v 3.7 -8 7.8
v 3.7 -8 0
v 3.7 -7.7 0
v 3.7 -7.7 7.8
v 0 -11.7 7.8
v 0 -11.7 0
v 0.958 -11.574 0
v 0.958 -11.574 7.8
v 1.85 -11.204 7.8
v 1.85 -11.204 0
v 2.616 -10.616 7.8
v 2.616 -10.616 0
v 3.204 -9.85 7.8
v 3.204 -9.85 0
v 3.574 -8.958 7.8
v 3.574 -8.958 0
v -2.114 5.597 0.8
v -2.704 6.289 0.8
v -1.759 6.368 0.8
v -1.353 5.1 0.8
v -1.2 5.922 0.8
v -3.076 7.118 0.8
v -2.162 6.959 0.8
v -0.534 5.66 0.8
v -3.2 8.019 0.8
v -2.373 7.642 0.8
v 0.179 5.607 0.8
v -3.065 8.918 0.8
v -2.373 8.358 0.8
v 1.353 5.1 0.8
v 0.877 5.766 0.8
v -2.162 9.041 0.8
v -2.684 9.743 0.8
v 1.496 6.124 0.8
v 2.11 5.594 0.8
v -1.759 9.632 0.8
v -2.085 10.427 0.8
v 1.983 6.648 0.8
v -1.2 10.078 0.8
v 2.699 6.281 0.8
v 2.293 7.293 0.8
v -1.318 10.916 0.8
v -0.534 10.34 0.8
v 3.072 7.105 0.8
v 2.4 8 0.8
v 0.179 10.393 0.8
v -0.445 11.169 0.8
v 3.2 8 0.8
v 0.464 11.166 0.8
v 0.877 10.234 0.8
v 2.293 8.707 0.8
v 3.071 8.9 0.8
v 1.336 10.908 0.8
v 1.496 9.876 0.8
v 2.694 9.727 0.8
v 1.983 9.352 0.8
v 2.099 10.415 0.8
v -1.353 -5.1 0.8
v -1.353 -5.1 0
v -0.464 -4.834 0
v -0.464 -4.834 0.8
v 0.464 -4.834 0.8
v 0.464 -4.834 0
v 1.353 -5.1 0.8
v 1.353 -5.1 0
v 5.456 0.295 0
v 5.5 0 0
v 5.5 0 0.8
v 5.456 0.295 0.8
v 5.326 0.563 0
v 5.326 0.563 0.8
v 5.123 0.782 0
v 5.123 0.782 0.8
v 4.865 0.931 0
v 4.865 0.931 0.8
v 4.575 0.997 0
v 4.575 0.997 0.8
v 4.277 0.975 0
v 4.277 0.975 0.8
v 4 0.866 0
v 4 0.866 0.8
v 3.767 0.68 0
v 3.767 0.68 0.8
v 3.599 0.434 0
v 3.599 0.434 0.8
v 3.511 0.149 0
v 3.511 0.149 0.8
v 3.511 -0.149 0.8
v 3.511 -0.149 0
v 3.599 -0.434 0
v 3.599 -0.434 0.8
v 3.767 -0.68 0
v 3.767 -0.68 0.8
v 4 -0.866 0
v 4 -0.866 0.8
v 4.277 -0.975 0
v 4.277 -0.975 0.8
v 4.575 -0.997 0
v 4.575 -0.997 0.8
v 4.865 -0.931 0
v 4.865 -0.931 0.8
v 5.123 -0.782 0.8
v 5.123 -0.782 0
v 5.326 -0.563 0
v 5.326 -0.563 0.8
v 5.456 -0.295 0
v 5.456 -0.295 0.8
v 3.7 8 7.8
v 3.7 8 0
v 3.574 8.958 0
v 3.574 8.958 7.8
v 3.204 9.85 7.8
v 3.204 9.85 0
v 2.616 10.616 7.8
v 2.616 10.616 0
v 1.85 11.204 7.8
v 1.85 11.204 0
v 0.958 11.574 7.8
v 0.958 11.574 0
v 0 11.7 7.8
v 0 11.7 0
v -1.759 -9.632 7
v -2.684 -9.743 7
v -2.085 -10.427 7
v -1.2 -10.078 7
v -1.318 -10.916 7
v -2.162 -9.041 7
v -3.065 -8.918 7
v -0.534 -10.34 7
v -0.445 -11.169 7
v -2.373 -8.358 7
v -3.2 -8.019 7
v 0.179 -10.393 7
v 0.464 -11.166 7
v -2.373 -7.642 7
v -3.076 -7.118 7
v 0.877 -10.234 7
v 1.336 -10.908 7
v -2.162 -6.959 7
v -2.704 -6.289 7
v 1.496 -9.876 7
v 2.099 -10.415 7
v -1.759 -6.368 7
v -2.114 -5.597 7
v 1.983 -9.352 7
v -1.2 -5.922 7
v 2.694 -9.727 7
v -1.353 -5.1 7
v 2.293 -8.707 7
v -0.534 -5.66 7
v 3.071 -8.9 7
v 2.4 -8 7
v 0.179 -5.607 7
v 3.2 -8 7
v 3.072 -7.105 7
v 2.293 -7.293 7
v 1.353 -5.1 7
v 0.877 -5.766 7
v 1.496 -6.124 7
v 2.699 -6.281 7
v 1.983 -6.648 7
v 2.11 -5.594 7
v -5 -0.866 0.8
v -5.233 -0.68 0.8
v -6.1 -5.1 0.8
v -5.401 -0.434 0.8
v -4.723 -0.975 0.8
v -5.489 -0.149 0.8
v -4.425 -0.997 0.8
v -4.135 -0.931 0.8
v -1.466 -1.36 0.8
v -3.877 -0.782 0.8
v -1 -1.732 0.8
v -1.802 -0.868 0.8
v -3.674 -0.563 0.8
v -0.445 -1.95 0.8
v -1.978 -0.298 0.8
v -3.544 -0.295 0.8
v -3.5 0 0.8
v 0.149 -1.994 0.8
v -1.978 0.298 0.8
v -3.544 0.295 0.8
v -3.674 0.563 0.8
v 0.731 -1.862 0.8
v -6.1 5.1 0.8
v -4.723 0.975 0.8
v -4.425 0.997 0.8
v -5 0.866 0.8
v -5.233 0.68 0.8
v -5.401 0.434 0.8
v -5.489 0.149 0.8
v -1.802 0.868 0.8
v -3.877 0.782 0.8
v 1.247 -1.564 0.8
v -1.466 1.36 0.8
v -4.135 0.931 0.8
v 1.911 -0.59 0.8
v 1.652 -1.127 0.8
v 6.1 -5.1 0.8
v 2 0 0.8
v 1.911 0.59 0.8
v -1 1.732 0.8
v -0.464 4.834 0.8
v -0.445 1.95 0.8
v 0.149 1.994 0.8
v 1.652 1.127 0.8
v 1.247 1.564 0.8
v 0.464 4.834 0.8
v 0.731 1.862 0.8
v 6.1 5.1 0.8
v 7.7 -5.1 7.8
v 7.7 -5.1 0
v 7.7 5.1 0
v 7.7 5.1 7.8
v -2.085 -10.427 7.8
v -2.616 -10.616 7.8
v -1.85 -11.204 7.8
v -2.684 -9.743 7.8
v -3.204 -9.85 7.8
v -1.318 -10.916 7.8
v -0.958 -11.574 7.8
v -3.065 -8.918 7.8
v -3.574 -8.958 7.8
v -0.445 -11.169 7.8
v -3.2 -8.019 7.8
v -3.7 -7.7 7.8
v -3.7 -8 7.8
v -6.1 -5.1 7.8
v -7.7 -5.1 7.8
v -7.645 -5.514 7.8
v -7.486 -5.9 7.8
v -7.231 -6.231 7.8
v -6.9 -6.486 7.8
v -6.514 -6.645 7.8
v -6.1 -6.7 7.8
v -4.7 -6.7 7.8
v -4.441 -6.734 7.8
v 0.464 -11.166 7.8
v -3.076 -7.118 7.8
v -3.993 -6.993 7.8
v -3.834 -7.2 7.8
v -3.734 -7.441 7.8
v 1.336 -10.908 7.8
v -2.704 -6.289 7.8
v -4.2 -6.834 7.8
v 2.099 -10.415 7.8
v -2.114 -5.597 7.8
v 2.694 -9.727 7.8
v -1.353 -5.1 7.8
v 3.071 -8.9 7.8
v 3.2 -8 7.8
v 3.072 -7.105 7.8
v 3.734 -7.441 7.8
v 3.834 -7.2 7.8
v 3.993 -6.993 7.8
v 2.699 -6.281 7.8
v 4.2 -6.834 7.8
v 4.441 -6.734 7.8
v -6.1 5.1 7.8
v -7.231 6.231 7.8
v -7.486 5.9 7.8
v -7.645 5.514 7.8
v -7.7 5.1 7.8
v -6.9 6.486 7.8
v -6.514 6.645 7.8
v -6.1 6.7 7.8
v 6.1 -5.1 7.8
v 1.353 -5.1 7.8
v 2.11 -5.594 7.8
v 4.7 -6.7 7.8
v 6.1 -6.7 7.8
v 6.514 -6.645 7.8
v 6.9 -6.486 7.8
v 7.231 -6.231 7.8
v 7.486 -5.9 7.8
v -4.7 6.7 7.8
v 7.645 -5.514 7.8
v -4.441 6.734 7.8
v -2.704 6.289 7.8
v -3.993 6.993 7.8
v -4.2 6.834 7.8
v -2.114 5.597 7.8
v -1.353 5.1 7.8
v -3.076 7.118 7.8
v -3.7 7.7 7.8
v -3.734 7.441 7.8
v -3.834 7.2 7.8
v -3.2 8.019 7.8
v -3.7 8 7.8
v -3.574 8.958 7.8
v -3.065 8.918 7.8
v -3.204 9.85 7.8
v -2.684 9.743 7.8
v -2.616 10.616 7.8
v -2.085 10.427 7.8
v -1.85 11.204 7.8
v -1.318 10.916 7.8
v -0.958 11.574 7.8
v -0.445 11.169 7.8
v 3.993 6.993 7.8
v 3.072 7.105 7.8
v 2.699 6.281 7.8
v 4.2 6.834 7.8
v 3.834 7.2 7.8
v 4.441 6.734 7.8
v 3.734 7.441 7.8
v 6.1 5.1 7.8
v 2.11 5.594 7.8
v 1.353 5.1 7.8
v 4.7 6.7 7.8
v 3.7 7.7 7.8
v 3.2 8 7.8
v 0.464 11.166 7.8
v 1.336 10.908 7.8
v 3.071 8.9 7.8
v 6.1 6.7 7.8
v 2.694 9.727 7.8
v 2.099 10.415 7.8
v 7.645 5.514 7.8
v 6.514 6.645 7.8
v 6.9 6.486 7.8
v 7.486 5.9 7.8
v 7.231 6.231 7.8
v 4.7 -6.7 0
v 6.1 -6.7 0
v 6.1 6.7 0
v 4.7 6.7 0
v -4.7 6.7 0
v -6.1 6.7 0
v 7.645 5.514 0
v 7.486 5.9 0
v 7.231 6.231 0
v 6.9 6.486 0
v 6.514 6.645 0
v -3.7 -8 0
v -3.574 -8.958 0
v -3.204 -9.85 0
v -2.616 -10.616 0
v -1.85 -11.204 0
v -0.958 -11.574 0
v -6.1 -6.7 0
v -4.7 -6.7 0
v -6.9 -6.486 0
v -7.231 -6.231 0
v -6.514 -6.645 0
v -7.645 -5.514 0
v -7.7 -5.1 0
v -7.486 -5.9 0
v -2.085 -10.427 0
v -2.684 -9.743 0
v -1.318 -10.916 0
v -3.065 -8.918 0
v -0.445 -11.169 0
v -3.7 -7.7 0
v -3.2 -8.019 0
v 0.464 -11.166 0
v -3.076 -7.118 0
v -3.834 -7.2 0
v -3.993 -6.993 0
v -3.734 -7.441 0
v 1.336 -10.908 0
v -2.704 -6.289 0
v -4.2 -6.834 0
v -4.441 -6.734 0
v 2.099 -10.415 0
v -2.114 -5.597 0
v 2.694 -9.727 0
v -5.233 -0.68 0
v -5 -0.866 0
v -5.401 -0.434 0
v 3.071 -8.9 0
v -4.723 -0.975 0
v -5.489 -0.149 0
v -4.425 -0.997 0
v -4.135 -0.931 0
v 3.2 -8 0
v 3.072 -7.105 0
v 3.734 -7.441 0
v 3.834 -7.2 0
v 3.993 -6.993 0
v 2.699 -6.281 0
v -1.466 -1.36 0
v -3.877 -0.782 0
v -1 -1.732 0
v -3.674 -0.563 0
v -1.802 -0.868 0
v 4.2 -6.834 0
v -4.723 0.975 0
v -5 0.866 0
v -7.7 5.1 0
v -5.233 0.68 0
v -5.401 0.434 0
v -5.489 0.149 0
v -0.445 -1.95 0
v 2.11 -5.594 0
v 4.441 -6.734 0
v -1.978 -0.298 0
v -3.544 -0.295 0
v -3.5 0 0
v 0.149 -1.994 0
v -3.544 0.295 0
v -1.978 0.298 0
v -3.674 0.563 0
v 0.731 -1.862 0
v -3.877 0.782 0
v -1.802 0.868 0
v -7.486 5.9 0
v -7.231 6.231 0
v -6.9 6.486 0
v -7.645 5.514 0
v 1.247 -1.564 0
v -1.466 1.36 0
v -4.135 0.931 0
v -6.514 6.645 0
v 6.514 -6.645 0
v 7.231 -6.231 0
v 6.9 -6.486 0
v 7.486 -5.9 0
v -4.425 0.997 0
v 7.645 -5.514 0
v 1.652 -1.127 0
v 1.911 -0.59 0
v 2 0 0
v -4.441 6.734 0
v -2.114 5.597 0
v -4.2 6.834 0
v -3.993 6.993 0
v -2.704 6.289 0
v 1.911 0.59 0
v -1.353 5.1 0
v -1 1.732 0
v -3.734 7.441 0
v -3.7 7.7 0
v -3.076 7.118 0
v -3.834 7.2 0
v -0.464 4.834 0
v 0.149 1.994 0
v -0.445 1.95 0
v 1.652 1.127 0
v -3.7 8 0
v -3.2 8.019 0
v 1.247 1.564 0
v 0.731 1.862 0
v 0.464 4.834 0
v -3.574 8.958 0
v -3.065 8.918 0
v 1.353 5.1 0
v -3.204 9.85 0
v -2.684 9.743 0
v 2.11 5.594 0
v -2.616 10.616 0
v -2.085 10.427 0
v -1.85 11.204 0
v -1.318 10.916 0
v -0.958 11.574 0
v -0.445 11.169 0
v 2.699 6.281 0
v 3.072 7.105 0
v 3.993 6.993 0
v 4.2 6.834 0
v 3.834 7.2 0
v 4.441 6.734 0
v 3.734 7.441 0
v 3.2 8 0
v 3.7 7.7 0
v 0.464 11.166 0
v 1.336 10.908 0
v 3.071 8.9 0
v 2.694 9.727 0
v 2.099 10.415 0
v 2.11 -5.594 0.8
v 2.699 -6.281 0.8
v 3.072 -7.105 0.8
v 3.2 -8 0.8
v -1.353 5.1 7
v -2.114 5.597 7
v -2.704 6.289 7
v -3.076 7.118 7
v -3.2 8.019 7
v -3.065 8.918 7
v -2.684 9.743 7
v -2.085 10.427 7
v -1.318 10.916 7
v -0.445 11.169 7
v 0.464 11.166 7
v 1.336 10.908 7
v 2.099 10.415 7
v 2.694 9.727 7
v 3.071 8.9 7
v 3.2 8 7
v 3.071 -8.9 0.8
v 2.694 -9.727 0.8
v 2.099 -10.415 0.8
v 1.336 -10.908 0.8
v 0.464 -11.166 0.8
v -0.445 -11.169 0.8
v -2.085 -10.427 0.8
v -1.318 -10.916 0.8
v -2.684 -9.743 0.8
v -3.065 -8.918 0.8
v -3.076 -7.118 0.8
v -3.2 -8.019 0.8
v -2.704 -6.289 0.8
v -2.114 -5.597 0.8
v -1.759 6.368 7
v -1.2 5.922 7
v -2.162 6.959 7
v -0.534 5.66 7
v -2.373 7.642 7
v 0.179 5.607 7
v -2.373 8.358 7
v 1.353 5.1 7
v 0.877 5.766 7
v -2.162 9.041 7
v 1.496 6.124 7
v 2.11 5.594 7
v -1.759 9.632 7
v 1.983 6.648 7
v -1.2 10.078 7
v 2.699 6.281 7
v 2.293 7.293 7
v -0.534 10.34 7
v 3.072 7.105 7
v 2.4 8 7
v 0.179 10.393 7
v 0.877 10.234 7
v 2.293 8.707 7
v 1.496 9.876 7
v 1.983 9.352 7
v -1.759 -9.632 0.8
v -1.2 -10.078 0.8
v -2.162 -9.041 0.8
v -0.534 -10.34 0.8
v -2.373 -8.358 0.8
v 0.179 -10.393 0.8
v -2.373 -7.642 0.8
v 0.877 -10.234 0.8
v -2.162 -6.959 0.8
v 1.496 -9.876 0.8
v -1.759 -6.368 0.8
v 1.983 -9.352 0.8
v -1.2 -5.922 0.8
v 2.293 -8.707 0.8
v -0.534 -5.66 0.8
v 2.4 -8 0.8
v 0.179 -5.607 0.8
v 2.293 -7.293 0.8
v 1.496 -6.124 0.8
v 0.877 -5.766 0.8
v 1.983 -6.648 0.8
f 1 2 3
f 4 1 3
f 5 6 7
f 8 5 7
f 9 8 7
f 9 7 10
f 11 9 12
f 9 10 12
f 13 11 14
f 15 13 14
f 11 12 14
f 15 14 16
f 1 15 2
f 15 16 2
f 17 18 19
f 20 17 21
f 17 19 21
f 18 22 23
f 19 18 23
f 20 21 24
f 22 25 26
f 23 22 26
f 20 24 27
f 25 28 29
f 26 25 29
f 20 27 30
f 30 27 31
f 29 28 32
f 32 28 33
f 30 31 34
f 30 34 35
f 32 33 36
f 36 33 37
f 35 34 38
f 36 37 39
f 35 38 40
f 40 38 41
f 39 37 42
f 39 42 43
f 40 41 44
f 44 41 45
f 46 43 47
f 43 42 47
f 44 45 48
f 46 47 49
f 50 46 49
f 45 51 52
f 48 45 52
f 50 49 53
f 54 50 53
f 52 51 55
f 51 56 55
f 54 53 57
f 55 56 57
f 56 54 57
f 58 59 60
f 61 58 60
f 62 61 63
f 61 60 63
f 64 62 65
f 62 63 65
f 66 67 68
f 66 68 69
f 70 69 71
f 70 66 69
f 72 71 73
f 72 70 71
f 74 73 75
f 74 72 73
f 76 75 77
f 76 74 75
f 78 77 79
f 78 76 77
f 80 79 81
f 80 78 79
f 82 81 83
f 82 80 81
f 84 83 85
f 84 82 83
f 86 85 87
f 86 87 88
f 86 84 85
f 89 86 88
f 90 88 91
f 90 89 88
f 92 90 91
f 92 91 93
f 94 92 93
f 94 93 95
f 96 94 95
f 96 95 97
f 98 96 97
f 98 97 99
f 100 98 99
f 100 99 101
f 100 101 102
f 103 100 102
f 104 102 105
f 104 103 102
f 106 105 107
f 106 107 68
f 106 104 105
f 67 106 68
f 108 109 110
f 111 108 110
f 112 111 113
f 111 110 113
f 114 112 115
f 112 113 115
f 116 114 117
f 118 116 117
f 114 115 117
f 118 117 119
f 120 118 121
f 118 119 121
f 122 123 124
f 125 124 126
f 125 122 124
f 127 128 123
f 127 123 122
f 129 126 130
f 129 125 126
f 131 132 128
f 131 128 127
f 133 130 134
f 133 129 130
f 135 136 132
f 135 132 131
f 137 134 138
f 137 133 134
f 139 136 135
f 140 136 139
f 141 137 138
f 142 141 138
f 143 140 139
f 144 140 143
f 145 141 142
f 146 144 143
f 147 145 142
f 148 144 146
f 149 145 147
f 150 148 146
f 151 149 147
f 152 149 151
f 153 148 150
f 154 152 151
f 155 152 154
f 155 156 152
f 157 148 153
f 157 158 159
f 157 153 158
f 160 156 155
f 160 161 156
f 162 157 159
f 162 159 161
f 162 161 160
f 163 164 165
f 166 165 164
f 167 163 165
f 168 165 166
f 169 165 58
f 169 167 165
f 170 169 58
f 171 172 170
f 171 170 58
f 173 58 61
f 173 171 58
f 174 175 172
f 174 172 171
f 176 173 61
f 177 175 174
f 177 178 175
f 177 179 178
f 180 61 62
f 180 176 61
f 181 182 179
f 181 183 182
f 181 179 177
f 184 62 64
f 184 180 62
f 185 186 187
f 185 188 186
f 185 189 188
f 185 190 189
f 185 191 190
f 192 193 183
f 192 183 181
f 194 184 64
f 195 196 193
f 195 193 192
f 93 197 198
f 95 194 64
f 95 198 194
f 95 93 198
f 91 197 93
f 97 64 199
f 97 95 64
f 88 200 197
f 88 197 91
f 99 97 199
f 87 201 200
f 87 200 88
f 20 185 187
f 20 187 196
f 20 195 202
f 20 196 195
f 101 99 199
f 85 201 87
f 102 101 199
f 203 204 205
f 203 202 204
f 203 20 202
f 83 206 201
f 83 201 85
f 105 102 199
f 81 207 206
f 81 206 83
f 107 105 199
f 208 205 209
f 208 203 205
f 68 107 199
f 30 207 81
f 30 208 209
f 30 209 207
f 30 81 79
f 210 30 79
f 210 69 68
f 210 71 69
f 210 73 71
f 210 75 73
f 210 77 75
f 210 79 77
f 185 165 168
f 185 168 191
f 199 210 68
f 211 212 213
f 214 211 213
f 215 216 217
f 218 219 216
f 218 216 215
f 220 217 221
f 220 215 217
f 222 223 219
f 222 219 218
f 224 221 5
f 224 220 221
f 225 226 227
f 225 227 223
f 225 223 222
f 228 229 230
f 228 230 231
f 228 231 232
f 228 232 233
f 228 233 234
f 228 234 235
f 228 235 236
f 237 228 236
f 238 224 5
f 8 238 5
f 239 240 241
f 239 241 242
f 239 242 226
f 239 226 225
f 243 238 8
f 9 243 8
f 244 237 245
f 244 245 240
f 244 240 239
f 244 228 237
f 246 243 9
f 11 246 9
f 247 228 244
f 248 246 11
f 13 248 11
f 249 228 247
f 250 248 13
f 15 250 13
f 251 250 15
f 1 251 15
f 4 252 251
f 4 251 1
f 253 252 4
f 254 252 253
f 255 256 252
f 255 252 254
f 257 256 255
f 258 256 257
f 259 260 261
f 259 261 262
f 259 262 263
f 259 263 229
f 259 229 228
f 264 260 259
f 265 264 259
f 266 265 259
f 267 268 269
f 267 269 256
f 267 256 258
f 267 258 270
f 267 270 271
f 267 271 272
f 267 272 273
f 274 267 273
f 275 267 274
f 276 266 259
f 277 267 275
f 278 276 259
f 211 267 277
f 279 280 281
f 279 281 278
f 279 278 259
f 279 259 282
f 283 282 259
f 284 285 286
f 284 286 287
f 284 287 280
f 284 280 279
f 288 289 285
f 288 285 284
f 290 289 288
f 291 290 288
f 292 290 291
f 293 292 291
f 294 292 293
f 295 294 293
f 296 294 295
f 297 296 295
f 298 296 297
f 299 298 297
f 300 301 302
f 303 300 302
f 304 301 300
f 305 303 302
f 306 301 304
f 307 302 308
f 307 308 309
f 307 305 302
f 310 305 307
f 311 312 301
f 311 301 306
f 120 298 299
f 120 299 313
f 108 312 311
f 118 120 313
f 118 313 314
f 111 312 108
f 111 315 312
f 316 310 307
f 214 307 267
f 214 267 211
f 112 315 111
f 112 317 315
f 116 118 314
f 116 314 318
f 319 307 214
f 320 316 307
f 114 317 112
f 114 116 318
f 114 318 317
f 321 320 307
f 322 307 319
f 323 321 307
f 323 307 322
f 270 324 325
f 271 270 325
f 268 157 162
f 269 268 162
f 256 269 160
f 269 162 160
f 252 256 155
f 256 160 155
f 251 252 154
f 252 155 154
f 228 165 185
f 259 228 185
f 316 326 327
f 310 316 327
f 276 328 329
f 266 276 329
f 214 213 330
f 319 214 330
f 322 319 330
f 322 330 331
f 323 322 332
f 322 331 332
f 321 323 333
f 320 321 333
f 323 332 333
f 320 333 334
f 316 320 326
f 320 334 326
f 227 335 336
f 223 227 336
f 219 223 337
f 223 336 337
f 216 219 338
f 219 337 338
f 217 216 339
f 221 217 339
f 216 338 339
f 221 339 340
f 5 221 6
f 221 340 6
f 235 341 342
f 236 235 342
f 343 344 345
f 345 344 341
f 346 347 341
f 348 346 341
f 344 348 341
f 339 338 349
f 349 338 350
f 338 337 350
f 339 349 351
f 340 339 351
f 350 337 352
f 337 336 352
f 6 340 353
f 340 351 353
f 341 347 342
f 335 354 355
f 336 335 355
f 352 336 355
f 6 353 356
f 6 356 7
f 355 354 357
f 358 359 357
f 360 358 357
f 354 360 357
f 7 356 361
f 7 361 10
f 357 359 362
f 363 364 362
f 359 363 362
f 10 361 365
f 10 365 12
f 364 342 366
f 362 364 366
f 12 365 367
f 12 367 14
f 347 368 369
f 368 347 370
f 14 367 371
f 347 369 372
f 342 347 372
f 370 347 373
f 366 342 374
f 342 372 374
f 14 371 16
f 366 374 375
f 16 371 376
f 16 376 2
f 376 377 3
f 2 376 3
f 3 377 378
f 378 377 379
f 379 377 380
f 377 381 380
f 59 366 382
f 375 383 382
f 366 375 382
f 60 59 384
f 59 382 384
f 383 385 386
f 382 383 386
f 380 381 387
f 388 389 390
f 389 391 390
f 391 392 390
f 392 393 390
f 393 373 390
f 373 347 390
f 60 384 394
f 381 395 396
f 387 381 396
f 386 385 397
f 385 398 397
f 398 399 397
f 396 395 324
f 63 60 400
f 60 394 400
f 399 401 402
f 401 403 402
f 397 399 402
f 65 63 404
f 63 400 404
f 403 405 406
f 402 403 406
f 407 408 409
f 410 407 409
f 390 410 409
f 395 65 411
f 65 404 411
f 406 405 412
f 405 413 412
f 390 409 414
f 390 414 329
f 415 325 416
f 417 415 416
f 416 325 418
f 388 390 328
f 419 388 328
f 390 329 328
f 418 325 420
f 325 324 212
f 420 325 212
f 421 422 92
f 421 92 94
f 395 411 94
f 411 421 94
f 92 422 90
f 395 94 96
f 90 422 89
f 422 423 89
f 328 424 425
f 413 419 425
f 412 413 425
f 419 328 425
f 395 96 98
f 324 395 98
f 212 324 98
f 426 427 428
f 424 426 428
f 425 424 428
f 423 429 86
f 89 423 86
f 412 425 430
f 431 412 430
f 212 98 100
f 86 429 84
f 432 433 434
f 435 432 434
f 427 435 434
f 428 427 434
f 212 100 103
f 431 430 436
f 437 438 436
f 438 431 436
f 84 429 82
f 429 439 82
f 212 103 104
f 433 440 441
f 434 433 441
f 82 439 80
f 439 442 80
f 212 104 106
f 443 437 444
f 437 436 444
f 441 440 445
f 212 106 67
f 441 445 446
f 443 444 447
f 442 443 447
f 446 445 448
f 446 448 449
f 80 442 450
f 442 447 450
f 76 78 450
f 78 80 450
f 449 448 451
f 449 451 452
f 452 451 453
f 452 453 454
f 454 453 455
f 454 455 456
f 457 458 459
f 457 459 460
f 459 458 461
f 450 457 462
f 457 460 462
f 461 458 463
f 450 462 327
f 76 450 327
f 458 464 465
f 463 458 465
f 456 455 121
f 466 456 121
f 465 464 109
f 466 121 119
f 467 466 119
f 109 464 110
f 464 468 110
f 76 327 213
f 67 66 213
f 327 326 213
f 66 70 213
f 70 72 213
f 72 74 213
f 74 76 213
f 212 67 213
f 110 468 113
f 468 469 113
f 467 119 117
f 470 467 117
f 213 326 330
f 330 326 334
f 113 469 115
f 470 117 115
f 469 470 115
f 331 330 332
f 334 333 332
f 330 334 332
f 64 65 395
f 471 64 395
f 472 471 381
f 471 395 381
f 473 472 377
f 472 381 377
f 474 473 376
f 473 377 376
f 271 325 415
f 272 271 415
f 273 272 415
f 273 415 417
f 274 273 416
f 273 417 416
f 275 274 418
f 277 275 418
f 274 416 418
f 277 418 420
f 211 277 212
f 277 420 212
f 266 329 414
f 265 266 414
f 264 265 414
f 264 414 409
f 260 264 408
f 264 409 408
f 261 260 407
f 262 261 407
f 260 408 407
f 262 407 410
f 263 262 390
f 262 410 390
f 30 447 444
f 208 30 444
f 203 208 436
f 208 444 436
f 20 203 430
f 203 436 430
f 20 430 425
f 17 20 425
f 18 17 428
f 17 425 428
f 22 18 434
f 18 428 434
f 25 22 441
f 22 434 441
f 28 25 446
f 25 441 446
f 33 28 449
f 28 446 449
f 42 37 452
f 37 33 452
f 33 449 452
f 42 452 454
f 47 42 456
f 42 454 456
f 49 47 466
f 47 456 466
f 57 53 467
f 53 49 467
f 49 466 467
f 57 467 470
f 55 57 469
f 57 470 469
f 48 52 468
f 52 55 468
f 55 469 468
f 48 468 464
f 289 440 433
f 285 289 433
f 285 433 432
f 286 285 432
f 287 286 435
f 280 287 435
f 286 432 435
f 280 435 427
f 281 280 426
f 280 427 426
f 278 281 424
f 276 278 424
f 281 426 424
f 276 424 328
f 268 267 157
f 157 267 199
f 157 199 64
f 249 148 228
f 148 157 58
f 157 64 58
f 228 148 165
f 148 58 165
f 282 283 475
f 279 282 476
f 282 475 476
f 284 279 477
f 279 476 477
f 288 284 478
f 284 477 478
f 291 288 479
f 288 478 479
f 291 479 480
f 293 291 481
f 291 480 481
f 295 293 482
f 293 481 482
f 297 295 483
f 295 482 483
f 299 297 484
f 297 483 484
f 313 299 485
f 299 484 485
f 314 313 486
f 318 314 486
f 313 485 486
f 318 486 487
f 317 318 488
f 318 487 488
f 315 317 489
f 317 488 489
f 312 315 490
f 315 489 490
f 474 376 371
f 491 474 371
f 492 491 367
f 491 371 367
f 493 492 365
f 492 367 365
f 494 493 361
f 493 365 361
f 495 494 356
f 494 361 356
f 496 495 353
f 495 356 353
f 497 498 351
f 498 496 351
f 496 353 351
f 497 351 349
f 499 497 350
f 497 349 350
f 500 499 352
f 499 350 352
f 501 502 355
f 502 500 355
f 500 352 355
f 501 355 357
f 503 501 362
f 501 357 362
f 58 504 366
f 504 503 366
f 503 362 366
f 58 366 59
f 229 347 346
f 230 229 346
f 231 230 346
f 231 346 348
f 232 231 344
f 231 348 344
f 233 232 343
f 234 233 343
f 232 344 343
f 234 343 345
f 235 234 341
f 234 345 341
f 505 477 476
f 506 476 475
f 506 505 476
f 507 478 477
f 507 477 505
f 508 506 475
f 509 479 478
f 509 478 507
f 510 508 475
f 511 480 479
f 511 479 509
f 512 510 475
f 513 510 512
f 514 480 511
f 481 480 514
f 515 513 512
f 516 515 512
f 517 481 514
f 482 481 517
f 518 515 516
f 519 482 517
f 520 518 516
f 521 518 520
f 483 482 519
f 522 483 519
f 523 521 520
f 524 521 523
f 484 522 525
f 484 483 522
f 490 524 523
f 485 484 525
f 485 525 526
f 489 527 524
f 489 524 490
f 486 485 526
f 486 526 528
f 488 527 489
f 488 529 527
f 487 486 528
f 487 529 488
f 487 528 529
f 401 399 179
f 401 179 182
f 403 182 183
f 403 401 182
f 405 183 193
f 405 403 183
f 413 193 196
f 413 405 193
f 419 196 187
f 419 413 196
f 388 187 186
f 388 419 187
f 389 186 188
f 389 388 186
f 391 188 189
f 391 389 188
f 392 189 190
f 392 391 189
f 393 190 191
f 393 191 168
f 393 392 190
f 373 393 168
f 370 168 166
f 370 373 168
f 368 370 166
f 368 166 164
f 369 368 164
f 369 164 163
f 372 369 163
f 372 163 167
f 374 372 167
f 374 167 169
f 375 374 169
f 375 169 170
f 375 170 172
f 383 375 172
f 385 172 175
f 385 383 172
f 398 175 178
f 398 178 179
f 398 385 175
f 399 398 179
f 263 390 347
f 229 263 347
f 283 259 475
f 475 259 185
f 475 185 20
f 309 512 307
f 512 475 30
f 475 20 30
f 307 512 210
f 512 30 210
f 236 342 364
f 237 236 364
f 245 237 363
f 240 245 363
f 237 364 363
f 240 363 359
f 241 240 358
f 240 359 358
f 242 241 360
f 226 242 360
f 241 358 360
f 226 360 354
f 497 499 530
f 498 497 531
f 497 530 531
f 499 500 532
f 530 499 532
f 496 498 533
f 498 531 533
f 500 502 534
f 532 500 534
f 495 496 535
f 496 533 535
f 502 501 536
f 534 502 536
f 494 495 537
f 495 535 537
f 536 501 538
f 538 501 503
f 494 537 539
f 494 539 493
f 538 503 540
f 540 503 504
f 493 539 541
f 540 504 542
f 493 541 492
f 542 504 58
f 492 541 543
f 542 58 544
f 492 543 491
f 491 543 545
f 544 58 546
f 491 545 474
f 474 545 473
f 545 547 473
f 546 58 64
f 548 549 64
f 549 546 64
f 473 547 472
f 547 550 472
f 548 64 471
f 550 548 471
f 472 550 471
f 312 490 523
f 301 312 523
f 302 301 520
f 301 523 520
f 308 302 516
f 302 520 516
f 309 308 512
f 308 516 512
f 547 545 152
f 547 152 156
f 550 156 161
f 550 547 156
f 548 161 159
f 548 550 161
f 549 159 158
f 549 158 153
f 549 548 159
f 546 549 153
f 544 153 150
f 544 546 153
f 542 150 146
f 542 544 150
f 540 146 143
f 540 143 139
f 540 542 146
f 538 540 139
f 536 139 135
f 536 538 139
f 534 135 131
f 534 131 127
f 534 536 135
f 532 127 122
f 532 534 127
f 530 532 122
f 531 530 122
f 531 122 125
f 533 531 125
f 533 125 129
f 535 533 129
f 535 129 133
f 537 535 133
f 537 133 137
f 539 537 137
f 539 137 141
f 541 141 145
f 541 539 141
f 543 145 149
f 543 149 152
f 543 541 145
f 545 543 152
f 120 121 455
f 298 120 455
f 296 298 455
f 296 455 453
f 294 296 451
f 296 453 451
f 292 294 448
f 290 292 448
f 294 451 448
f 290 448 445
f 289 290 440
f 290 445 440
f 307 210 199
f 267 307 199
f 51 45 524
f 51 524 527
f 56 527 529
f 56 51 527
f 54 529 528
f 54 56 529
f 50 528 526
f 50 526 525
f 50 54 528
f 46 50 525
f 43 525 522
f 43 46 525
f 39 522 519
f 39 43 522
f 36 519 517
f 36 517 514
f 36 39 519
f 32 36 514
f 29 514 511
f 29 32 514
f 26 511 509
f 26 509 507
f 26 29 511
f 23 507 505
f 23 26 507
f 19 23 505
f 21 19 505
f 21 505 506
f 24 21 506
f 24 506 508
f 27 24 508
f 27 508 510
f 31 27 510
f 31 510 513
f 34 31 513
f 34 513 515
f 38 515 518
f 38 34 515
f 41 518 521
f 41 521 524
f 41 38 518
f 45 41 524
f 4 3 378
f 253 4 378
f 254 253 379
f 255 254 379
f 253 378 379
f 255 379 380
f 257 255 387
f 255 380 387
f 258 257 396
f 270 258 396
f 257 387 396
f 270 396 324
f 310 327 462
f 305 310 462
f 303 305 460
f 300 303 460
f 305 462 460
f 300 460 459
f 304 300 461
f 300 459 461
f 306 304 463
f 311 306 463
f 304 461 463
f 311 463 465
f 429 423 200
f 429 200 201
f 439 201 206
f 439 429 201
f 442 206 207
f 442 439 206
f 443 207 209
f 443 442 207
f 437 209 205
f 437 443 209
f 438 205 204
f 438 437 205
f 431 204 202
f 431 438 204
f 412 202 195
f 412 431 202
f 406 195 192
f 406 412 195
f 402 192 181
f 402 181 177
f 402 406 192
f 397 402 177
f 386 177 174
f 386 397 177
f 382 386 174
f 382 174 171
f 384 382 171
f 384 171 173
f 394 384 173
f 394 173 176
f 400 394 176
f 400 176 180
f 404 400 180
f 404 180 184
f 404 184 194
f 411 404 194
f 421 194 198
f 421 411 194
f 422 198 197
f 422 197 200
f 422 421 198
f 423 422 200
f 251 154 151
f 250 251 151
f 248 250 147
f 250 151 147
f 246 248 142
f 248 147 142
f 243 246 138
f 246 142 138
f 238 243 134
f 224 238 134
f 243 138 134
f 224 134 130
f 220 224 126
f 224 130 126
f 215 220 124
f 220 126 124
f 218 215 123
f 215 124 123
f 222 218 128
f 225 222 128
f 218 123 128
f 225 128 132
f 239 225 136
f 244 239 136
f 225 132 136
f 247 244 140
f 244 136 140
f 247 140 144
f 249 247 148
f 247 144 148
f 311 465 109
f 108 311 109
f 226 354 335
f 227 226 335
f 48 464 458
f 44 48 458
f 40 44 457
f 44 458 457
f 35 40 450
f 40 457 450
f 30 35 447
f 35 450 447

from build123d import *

# Parameters (mm, degrees)
F1_DEPTH = 7.8
F2_START = 0.8
F0_R     = 2.4
F2_DEPTH = 6.2
F0_R_2   = 1
F0_R_3   = 2
F3_DEPTH = 0.8


# Not quite as in the source:
# - a feature names something its author has since deleted; it is built from what else it names


with BuildPart() as f1:
    # F0 (on Top) → F1 (new body)
    with BuildSketch(Plane.XY):
        with BuildLine():
            ThreePointArc((0, 11.7), (-2.6162950904, 10.6162950904), (-3.7, 8))
            Line((-3.7, 8), (-3.7, 7.7))
            ThreePointArc((-3.7, 7.7), (-3.9928932188, 6.9928932188), (-4.7, 6.7))
            Line((-4.7, 6.7), (-6.1, 6.7))
            ThreePointArc((-6.1, 6.7), (-7.2313708499, 6.2313708499), (-7.7, 5.1))
            Line((-7.7, 5.1), (-7.7, -5.1))
            ThreePointArc((-7.7, -5.1), (-7.2313708499, -6.2313708499), (-6.1, -6.7))
            Line((-6.1, -6.7), (-4.7, -6.7))
            ThreePointArc((-4.7, -6.7), (-3.9928932188, -6.9928932188), (-3.7, -7.7))
            Line((-3.7, -7.7), (-3.7, -8))
            ThreePointArc((-3.7, -8), (-2.6162950904, -10.6162950904), (0, -11.7))
            ThreePointArc((0, -11.7), (2.6162950904, -10.6162950904), (3.7, -8))
            Line((3.7, -8), (3.7, -7.7))
            ThreePointArc((3.7, -7.7), (3.9928932188, -6.9928932188), (4.7, -6.7))
            Line((4.7, -6.7), (6.1, -6.7))
            ThreePointArc((6.1, -6.7), (7.2313708499, -6.2313708499), (7.7, -5.1))
            Line((7.7, -5.1), (7.7, 5.1))
            ThreePointArc((7.7, 5.1), (7.2313708499, 6.2313708499), (6.1, 6.7))
            Line((6.1, 6.7), (4.7, 6.7))
            ThreePointArc((4.7, 6.7), (3.9928932188, 6.9928932188), (3.7, 7.7))
            Line((3.7, 7.7), (3.7, 8))
            ThreePointArc((3.7, 8), (2.6162950904, 10.6162950904), (0, 11.7))
        make_face()
        with BuildLine():
            Line((-6.1, -5.1), (-6.1, 5.1))
            Line((-6.1, 5.1), (-1.3527749258, 5.1))
            ThreePointArc((-1.3527749258, 5.1), (-1.7191742549, 10.698970152), (3.2, 8))
            ThreePointArc((3.2, 8), (2.698970152, 6.2808257451), (1.3527749258, 5.1))
            Line((1.3527749258, 5.1), (6.1, 5.1))
            Line((6.1, 5.1), (6.1, -5.1))
            Line((6.1, -5.1), (1.3527749258, -5.1))
            ThreePointArc((1.3527749258, -5.1), (2.698970152, -6.2808257451), (3.2, -8))
            ThreePointArc((3.2, -8), (-1.7191742549, -10.698970152), (-1.3527749258, -5.1))
            Line((-1.3527749258, -5.1), (-6.1, -5.1))
        make_face(mode=Mode.SUBTRACT)
    extrude(amount=F1_DEPTH)

    # F0 (on Top) → F2 (join)
    with BuildSketch(Plane.XY.offset(F2_START)):
        with BuildLine():
            Line((1.3527749258, -5.1), (-1.3527749258, -5.1))
            ThreePointArc((-1.3527749258, -5.1), (-1.7191742549, -10.698970152), (3.2, -8))
            ThreePointArc((3.2, -8), (2.698970152, -6.2808257451), (1.3527749258, -5.1))
        make_face()
        with Locations((0, -8)):
            Circle(F0_R, mode=Mode.SUBTRACT)
        with BuildLine():
            ThreePointArc((3.2, 8), (-1.7191742549, 10.698970152), (-1.3527749258, 5.1))
            Line((-1.3527749258, 5.1), (1.3527749258, 5.1))
            ThreePointArc((1.3527749258, 5.1), (2.698970152, 6.2808257451), (3.2, 8))
        make_face()
        with Locations((0, 8)):
            Circle(F0_R, mode=Mode.SUBTRACT)
    extrude(amount=F2_DEPTH)

    # F0 (on Top) → F3 (join)
    with BuildSketch(Plane.XY):
        with BuildLine():
            Line((-1.3527749258, 5.1), (-6.1, 5.1))
            Line((-6.1, 5.1), (-6.1, -5.1))
            Line((-6.1, -5.1), (-1.3527749258, -5.1))
            ThreePointArc((-1.3527749258, -5.1), (0, -4.8), (1.3527749258, -5.1))
            Line((1.3527749258, -5.1), (6.1, -5.1))
            Line((6.1, -5.1), (6.1, 5.1))
            Line((6.1, 5.1), (1.3527749258, 5.1))
            ThreePointArc((1.3527749258, 5.1), (0, 4.8), (-1.3527749258, 5.1))
        make_face()
        with Locations((-4.5, 0)):
            Circle(F0_R_2, mode=Mode.SUBTRACT)
        Circle(F0_R_3, mode=Mode.SUBTRACT)
        with Locations((4.5, 0)):
            Circle(F0_R_2, mode=Mode.SUBTRACT)
    extrude(amount=F3_DEPTH)


solid = f1.part
